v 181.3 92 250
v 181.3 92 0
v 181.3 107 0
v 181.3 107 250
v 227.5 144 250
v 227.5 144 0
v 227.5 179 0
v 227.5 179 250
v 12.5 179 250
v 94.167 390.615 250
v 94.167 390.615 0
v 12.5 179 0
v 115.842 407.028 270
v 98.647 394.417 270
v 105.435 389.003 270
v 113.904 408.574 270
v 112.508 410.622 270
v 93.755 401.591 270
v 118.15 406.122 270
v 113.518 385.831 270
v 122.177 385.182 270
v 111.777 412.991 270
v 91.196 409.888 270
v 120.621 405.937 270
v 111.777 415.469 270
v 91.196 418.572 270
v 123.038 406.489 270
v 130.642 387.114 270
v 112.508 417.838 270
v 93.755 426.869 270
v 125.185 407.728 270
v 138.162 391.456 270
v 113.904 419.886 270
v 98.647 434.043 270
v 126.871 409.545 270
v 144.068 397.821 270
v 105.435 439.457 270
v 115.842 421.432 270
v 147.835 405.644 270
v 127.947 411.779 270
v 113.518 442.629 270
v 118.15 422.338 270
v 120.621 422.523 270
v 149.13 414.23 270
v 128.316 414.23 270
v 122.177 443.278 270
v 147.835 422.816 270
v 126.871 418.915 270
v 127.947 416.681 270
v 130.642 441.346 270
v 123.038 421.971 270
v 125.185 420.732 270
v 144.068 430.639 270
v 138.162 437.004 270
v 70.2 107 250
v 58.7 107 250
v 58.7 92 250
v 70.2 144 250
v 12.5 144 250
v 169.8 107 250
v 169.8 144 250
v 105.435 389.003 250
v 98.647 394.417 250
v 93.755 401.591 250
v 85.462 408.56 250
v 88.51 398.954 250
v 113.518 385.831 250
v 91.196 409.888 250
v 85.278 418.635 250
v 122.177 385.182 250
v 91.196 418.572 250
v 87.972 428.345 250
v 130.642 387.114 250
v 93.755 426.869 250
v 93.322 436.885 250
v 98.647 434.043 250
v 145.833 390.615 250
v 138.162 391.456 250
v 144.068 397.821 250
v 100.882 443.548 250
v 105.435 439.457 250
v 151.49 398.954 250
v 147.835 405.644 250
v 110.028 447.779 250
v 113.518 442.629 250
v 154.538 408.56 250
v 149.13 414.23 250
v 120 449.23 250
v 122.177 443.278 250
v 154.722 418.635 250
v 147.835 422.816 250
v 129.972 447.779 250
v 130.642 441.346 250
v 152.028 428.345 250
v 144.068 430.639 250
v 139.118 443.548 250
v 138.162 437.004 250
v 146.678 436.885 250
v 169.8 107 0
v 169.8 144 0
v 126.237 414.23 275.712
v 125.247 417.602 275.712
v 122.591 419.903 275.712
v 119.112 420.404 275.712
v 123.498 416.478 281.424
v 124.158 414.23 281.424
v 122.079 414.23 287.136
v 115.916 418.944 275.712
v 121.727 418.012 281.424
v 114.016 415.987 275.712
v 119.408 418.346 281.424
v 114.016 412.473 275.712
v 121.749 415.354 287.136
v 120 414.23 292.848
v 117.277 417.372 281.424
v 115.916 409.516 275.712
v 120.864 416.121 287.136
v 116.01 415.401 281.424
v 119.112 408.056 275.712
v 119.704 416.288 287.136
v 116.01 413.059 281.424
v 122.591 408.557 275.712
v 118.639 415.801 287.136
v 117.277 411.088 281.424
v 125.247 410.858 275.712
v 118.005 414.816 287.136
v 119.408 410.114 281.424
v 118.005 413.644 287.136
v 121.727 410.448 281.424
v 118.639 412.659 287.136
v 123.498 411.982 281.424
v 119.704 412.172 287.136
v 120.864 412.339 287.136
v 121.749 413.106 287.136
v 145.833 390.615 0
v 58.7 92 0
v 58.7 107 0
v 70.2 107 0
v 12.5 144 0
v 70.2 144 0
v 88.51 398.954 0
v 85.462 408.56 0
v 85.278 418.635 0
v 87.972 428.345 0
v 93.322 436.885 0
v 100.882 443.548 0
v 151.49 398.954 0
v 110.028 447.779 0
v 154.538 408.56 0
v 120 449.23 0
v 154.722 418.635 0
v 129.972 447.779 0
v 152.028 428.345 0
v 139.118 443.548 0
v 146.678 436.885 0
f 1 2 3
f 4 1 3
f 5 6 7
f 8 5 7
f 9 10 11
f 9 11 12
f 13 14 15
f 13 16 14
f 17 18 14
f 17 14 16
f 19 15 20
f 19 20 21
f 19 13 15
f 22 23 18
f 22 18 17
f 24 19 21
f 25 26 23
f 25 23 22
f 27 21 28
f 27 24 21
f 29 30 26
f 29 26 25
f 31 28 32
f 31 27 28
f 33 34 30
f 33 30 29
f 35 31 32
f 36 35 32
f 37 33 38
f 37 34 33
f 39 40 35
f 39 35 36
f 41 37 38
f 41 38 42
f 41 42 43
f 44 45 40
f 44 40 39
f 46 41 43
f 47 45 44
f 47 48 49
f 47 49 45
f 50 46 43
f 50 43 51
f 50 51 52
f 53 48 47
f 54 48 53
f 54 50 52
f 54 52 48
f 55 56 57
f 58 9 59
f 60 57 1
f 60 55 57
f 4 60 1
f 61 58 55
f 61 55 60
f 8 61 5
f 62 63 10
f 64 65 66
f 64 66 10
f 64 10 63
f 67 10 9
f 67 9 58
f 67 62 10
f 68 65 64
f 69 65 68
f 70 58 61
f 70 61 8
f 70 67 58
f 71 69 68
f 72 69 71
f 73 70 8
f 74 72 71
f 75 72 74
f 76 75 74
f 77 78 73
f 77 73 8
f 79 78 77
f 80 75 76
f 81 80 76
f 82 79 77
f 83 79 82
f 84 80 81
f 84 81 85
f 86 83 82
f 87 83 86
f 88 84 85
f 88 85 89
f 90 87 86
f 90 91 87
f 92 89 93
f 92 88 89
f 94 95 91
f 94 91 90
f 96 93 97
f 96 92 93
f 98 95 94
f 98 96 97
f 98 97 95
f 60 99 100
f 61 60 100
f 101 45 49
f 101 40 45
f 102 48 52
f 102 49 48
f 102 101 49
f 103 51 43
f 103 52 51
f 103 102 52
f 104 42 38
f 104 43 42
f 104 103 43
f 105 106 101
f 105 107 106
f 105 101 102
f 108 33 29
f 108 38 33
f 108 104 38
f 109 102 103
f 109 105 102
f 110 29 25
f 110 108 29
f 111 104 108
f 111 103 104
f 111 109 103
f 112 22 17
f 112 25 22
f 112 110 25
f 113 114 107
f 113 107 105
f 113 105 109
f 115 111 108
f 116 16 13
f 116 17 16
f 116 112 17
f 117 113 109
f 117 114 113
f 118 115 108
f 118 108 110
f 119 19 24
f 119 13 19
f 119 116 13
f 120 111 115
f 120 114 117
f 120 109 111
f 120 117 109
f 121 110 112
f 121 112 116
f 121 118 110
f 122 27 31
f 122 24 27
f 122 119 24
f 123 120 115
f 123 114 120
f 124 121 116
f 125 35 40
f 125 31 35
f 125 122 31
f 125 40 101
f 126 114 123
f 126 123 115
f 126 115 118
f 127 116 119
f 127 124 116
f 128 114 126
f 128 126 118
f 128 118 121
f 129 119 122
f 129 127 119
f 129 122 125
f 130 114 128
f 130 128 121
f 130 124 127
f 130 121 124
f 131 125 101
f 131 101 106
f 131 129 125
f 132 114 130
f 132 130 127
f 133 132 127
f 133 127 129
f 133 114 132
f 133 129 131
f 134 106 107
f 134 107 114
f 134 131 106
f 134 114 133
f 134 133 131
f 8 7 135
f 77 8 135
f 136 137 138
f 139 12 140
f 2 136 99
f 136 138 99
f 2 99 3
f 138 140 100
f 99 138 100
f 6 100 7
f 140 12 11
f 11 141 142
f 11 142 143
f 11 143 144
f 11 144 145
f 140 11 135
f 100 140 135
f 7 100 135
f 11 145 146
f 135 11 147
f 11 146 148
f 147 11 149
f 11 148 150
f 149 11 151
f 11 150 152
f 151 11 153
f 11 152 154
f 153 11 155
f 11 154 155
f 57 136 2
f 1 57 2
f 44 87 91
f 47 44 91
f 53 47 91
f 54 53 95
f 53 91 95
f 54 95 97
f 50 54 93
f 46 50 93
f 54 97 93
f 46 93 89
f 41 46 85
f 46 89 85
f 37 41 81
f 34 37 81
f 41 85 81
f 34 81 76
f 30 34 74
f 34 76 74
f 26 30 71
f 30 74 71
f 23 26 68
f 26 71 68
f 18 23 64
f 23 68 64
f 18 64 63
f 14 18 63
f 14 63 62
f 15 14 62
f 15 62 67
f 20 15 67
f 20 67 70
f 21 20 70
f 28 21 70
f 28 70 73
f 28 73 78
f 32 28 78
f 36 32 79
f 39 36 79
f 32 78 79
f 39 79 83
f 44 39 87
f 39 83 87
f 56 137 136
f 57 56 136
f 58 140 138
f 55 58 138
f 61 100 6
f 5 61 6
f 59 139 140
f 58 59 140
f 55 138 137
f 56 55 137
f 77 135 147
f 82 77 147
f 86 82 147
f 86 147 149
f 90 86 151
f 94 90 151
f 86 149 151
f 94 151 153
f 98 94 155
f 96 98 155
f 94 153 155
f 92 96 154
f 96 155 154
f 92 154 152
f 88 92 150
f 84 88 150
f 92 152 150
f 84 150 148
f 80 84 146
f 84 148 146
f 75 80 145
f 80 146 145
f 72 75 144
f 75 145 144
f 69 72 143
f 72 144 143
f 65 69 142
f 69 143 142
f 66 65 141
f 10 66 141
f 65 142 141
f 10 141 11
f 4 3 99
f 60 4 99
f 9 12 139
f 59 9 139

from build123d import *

# Parameters (mm, degrees)
SZKIC1_R                    = 35
DODANIE_WYCI_GNI_CIE2_DEPTH = 250
SZKIC4_R                    = 29.129576732
DODANIE_WYCI_GNI_CIE3_DEPTH = 20
SZKIC5_R                    = 8.316
DODANIE_WYCI_GNI_CIE4_DEPTH = 36
DODANIE_WYCI_GNI_CIE4_TAPER = 20


with BuildPart() as part:
    # Szkic1 → Dodanie-wyciągnięcie2 (new body)
    with BuildSketch(Plane.XY):
        with BuildLine():
            Line((12.5, 179), (12.5, 144))
            Line((12.5, 144), (70.2, 144))
            Line((70.2, 144), (70.2, 107))
            Line((70.2, 107), (58.7, 107))
            Line((58.7, 107), (58.7, 92))
            Line((58.7, 92), (181.3, 92))
            Line((181.3, 92), (181.3, 107))
            Line((181.3, 107), (169.8, 107))
            Line((169.8, 107), (169.8, 144))
            Line((169.8, 144), (227.5, 144))
            Line((227.5, 144), (227.5, 179))
            Line((227.5, 179), (145.832850365, 390.615092801))
            ThreePointArc((145.832850365, 390.615092801), (120, 379.23), (94.167149635, 390.615092801))
            Line((94.167149635, 390.615092801), (12.5, 179))
        make_face()
        with Locations((120, 414.23)):
            Circle(SZKIC1_R)
    extrude(amount=DODANIE_WYCI_GNI_CIE2_DEPTH)

    # Szkic4 → Dodanie-wyciągnięcie3 (add)
    with BuildSketch(Plane.XY.offset(250)):
        with Locations((120, 414.23)):
            Circle(SZKIC4_R)
    extrude(amount=DODANIE_WYCI_GNI_CIE3_DEPTH)

    # Szkic5 → Dodanie-wyciągnięcie4 (add)
    with BuildSketch(Plane.XY.offset(270)):
        with Locations((120, 414.23)):
            Circle(SZKIC5_R)
    extrude(amount=DODANIE_WYCI_GNI_CIE4_DEPTH, taper=DODANIE_WYCI_GNI_CIE4_TAPER)


solid = part.part
